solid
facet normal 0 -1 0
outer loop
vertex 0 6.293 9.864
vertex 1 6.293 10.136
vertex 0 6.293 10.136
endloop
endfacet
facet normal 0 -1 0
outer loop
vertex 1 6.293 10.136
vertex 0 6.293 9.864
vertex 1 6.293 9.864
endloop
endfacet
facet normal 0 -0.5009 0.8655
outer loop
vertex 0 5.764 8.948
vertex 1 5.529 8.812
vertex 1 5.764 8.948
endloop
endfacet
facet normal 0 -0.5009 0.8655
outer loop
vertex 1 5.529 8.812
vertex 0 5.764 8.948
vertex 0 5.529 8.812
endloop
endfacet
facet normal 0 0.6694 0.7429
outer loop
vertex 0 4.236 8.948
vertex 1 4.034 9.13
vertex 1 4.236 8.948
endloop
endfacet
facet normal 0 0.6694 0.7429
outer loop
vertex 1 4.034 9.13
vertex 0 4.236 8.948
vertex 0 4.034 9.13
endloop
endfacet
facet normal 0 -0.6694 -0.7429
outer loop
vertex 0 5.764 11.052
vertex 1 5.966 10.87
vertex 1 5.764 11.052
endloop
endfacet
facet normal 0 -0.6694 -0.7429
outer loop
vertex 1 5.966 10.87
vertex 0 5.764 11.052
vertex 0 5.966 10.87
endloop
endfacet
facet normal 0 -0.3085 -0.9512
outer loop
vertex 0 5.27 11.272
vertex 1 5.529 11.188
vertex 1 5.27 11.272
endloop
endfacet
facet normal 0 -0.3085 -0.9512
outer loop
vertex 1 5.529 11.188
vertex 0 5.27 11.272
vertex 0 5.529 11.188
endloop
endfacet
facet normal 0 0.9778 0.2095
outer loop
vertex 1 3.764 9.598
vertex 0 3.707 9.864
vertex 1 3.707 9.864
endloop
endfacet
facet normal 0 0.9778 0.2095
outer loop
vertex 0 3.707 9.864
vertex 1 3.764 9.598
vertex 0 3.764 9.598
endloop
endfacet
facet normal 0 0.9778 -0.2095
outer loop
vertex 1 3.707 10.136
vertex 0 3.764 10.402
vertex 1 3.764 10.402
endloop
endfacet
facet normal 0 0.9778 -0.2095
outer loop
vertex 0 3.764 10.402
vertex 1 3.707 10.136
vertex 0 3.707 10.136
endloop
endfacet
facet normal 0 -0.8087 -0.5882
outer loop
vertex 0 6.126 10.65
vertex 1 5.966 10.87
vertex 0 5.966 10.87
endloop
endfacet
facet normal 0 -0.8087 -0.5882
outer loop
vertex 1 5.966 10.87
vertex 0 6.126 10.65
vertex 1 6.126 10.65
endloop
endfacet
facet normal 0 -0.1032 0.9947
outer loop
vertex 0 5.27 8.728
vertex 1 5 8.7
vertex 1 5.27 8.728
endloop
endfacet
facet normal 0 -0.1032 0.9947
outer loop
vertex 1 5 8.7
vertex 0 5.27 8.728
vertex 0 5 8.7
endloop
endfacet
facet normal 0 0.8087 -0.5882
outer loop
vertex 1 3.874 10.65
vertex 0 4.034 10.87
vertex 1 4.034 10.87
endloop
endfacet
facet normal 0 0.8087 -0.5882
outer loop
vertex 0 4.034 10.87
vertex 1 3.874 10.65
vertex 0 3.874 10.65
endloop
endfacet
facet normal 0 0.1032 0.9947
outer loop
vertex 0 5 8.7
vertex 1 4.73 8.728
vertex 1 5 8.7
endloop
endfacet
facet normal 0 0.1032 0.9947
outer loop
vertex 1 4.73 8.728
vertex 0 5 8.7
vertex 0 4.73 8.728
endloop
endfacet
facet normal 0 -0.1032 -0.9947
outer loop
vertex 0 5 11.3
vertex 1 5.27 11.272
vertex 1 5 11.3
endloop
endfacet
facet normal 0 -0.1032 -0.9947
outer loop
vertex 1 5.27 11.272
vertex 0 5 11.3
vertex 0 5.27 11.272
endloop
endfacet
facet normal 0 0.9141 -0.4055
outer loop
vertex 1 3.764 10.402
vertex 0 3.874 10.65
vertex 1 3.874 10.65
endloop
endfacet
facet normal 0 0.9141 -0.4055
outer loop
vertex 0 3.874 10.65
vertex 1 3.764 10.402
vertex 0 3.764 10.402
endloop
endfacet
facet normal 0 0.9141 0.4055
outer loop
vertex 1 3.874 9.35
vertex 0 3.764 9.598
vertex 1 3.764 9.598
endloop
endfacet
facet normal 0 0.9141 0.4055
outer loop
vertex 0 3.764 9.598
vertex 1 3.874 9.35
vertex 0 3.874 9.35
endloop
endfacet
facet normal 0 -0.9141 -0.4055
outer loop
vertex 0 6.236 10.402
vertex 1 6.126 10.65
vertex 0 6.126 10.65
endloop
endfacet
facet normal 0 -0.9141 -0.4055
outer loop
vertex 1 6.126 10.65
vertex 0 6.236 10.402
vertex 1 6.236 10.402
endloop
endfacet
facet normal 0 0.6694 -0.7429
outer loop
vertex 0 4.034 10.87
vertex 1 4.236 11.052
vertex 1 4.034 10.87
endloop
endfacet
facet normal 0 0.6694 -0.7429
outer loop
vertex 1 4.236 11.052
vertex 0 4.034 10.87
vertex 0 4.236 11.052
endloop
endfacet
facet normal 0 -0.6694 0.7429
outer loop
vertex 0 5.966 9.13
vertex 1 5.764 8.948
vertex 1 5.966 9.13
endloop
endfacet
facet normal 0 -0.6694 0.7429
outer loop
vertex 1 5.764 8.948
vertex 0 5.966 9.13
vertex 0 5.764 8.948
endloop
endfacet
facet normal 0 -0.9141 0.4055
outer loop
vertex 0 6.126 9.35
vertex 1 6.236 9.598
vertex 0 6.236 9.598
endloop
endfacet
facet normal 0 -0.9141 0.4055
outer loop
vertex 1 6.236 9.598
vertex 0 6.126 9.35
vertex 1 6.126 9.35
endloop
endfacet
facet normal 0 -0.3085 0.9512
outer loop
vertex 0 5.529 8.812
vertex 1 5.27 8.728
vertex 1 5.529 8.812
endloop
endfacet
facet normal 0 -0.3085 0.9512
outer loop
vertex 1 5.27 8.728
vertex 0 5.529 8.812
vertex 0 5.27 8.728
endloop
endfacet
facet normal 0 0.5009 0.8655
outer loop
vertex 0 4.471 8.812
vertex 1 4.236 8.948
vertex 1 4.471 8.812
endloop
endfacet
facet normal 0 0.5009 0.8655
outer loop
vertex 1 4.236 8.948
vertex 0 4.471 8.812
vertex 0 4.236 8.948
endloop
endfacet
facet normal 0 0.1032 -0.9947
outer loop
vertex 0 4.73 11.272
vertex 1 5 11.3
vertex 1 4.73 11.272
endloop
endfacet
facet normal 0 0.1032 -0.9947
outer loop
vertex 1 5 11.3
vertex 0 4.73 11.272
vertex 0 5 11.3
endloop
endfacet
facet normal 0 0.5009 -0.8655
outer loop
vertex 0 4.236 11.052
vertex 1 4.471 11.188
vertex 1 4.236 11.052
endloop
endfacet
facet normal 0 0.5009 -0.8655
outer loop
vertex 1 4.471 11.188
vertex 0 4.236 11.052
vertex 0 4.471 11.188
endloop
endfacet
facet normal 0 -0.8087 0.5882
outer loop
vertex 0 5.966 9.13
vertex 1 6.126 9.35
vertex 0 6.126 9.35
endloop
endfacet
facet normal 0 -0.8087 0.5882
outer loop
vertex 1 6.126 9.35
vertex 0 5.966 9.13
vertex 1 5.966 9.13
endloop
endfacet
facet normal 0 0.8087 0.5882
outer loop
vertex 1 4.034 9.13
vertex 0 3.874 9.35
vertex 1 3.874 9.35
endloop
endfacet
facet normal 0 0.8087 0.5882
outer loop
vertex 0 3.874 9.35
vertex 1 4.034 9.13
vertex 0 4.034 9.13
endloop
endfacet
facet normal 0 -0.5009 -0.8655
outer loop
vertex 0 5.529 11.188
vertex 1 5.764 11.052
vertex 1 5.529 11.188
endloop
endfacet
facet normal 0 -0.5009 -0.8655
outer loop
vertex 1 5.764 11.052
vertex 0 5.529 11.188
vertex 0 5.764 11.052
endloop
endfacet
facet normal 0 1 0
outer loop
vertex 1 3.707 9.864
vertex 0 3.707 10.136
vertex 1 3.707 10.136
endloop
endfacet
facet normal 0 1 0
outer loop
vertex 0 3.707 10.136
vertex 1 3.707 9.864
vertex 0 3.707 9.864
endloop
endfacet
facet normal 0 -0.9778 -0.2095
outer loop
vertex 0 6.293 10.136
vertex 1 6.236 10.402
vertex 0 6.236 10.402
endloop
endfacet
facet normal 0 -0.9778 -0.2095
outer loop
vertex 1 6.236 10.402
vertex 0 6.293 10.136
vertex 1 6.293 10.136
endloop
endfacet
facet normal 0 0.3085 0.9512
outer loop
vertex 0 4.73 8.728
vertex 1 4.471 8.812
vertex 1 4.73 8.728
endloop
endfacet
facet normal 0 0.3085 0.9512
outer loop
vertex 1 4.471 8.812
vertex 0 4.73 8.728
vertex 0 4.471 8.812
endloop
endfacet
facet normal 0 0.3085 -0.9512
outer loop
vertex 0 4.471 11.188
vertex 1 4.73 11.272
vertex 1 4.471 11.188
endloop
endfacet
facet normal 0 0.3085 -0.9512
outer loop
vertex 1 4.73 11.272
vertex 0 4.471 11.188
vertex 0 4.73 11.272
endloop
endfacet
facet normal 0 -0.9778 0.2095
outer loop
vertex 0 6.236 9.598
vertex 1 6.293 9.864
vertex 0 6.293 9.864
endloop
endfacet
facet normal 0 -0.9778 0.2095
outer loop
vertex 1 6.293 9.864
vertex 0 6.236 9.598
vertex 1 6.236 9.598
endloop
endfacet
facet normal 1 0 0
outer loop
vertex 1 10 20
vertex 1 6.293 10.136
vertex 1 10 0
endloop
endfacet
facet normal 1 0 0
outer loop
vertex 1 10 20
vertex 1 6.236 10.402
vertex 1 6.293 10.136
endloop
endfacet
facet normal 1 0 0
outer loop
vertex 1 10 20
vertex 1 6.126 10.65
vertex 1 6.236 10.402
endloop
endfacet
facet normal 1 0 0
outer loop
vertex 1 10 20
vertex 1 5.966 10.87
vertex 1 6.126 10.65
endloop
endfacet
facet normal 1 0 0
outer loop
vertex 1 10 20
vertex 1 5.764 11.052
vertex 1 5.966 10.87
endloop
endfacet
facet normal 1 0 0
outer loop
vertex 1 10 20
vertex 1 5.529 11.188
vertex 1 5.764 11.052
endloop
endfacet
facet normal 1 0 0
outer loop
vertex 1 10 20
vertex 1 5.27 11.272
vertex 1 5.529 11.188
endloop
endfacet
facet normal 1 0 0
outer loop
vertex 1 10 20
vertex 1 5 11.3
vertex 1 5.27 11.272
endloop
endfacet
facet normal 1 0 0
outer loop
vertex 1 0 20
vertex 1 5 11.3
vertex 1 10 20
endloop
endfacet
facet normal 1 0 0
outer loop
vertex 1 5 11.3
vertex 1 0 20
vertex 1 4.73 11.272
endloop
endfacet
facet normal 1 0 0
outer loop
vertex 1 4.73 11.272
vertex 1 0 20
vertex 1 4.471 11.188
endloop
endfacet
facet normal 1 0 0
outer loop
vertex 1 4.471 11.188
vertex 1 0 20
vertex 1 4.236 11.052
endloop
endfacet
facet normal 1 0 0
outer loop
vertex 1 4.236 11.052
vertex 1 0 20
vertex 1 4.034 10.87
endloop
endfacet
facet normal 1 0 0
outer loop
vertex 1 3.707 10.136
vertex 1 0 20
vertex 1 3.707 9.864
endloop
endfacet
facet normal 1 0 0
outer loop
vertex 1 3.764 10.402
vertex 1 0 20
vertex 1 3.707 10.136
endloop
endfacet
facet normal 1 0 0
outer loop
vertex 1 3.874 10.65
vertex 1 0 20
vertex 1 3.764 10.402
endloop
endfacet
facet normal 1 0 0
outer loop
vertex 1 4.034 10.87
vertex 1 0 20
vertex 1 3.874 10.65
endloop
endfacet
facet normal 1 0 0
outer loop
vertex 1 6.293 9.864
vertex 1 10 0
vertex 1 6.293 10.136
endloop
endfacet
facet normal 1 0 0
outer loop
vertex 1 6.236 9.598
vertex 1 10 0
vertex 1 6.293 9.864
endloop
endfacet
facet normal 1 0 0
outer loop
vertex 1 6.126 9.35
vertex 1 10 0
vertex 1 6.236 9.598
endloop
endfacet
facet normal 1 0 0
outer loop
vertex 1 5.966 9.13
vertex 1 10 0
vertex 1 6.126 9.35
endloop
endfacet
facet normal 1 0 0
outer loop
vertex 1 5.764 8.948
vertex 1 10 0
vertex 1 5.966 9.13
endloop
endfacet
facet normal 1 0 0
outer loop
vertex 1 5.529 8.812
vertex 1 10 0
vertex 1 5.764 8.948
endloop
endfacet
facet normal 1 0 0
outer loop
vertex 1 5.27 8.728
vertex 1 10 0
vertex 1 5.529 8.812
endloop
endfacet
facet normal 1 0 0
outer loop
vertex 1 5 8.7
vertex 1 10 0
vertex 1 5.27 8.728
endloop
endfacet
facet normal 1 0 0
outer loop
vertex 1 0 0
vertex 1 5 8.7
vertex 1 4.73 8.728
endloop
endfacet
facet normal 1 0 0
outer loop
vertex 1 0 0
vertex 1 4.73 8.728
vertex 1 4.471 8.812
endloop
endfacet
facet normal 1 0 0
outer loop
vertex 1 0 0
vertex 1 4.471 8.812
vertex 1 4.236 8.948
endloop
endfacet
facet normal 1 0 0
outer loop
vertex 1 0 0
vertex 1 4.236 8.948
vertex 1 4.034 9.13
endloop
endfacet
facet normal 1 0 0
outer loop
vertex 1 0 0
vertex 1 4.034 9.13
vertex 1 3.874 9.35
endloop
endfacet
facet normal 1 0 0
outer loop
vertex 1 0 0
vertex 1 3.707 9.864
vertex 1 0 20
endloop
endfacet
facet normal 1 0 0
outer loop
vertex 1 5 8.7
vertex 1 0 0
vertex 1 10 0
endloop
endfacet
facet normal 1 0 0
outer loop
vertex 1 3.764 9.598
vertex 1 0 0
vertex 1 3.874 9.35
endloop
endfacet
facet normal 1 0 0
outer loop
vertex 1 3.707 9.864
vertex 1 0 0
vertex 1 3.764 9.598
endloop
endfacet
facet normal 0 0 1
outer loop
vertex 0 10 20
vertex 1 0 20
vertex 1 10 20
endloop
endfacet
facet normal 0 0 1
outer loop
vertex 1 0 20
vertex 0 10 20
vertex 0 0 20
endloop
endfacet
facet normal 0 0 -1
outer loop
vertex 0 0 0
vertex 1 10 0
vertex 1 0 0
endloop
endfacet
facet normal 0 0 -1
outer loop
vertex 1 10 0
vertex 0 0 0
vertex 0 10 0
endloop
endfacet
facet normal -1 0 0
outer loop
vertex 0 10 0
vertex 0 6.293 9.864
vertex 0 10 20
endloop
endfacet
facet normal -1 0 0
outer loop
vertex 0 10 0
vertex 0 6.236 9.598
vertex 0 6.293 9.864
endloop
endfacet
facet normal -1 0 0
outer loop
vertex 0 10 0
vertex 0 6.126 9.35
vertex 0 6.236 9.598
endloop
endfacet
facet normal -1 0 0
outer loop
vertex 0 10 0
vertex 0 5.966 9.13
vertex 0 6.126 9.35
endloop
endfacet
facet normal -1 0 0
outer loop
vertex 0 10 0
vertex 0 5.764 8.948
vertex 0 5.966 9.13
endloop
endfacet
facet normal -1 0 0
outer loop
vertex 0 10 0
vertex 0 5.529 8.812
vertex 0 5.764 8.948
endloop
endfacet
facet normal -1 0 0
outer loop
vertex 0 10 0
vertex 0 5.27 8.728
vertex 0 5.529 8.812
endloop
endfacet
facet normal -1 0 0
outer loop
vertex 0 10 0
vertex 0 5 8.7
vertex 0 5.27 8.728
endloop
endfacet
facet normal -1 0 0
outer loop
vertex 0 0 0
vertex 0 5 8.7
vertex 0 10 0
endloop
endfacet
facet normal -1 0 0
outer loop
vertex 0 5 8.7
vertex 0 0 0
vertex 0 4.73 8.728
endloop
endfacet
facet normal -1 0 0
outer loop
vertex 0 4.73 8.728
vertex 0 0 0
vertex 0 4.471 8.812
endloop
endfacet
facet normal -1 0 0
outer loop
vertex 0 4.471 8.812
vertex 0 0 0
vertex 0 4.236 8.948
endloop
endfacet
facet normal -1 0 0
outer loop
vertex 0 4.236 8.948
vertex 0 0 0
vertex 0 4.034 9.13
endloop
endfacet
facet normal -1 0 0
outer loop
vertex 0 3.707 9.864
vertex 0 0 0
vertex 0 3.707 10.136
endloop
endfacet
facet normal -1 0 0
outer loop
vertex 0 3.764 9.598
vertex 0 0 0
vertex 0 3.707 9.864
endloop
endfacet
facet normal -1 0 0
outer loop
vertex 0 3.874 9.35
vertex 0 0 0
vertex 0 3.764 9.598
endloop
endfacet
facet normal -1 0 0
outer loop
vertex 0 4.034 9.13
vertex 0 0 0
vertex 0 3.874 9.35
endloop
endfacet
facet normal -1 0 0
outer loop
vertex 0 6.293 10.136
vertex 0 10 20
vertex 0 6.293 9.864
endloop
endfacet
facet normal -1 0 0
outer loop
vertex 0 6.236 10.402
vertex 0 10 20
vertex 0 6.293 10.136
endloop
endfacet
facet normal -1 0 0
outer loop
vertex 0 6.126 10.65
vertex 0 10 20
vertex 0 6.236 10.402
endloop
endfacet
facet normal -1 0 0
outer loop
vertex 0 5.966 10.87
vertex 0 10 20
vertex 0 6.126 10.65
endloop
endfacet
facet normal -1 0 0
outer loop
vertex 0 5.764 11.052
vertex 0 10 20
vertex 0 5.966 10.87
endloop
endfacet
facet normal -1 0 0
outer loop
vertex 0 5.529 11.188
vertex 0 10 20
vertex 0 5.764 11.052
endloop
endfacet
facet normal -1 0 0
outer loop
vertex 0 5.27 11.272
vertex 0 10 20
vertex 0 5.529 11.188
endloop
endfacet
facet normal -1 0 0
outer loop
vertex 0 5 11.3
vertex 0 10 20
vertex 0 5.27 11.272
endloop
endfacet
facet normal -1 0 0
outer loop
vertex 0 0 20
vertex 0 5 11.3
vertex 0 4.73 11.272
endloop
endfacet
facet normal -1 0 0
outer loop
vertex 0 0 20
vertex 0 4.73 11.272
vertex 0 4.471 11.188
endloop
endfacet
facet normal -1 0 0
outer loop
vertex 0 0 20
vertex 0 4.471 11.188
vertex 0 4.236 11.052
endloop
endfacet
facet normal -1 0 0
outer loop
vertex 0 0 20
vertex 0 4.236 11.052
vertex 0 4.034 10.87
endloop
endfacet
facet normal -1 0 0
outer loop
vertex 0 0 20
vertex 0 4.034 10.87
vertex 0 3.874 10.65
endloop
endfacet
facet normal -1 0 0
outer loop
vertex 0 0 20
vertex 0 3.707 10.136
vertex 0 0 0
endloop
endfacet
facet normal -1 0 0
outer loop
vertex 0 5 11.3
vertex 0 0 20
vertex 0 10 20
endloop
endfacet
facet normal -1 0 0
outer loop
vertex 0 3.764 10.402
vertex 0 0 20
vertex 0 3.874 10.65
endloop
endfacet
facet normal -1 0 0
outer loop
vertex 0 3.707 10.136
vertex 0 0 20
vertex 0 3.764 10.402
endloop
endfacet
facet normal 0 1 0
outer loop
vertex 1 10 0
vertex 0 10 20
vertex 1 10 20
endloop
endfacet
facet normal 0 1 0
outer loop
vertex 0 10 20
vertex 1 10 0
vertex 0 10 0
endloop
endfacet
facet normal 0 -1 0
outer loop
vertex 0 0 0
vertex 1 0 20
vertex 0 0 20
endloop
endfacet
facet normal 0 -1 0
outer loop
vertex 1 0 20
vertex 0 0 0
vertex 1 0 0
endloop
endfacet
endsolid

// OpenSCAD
difference(){
	union(){        
        translate([0,0,0]){
           cube([1,10,20], center=false);
        }
	

        
	}
	union() {
        
    // schroefdraad
            translate([-10,5,10]){
                rotate(a = [0,90,0]) {
                    cylinder(h=400, r=1.3, $fn=30, center=false);
                }
            }	
        
        // montage gaten
        
        translate([5,5,-10]){
            rotate(a = [0,0,0]) {
                cylinder(h=400, r=1.3, $fn=30, center=false);
            }
        }	

	


	}
}
